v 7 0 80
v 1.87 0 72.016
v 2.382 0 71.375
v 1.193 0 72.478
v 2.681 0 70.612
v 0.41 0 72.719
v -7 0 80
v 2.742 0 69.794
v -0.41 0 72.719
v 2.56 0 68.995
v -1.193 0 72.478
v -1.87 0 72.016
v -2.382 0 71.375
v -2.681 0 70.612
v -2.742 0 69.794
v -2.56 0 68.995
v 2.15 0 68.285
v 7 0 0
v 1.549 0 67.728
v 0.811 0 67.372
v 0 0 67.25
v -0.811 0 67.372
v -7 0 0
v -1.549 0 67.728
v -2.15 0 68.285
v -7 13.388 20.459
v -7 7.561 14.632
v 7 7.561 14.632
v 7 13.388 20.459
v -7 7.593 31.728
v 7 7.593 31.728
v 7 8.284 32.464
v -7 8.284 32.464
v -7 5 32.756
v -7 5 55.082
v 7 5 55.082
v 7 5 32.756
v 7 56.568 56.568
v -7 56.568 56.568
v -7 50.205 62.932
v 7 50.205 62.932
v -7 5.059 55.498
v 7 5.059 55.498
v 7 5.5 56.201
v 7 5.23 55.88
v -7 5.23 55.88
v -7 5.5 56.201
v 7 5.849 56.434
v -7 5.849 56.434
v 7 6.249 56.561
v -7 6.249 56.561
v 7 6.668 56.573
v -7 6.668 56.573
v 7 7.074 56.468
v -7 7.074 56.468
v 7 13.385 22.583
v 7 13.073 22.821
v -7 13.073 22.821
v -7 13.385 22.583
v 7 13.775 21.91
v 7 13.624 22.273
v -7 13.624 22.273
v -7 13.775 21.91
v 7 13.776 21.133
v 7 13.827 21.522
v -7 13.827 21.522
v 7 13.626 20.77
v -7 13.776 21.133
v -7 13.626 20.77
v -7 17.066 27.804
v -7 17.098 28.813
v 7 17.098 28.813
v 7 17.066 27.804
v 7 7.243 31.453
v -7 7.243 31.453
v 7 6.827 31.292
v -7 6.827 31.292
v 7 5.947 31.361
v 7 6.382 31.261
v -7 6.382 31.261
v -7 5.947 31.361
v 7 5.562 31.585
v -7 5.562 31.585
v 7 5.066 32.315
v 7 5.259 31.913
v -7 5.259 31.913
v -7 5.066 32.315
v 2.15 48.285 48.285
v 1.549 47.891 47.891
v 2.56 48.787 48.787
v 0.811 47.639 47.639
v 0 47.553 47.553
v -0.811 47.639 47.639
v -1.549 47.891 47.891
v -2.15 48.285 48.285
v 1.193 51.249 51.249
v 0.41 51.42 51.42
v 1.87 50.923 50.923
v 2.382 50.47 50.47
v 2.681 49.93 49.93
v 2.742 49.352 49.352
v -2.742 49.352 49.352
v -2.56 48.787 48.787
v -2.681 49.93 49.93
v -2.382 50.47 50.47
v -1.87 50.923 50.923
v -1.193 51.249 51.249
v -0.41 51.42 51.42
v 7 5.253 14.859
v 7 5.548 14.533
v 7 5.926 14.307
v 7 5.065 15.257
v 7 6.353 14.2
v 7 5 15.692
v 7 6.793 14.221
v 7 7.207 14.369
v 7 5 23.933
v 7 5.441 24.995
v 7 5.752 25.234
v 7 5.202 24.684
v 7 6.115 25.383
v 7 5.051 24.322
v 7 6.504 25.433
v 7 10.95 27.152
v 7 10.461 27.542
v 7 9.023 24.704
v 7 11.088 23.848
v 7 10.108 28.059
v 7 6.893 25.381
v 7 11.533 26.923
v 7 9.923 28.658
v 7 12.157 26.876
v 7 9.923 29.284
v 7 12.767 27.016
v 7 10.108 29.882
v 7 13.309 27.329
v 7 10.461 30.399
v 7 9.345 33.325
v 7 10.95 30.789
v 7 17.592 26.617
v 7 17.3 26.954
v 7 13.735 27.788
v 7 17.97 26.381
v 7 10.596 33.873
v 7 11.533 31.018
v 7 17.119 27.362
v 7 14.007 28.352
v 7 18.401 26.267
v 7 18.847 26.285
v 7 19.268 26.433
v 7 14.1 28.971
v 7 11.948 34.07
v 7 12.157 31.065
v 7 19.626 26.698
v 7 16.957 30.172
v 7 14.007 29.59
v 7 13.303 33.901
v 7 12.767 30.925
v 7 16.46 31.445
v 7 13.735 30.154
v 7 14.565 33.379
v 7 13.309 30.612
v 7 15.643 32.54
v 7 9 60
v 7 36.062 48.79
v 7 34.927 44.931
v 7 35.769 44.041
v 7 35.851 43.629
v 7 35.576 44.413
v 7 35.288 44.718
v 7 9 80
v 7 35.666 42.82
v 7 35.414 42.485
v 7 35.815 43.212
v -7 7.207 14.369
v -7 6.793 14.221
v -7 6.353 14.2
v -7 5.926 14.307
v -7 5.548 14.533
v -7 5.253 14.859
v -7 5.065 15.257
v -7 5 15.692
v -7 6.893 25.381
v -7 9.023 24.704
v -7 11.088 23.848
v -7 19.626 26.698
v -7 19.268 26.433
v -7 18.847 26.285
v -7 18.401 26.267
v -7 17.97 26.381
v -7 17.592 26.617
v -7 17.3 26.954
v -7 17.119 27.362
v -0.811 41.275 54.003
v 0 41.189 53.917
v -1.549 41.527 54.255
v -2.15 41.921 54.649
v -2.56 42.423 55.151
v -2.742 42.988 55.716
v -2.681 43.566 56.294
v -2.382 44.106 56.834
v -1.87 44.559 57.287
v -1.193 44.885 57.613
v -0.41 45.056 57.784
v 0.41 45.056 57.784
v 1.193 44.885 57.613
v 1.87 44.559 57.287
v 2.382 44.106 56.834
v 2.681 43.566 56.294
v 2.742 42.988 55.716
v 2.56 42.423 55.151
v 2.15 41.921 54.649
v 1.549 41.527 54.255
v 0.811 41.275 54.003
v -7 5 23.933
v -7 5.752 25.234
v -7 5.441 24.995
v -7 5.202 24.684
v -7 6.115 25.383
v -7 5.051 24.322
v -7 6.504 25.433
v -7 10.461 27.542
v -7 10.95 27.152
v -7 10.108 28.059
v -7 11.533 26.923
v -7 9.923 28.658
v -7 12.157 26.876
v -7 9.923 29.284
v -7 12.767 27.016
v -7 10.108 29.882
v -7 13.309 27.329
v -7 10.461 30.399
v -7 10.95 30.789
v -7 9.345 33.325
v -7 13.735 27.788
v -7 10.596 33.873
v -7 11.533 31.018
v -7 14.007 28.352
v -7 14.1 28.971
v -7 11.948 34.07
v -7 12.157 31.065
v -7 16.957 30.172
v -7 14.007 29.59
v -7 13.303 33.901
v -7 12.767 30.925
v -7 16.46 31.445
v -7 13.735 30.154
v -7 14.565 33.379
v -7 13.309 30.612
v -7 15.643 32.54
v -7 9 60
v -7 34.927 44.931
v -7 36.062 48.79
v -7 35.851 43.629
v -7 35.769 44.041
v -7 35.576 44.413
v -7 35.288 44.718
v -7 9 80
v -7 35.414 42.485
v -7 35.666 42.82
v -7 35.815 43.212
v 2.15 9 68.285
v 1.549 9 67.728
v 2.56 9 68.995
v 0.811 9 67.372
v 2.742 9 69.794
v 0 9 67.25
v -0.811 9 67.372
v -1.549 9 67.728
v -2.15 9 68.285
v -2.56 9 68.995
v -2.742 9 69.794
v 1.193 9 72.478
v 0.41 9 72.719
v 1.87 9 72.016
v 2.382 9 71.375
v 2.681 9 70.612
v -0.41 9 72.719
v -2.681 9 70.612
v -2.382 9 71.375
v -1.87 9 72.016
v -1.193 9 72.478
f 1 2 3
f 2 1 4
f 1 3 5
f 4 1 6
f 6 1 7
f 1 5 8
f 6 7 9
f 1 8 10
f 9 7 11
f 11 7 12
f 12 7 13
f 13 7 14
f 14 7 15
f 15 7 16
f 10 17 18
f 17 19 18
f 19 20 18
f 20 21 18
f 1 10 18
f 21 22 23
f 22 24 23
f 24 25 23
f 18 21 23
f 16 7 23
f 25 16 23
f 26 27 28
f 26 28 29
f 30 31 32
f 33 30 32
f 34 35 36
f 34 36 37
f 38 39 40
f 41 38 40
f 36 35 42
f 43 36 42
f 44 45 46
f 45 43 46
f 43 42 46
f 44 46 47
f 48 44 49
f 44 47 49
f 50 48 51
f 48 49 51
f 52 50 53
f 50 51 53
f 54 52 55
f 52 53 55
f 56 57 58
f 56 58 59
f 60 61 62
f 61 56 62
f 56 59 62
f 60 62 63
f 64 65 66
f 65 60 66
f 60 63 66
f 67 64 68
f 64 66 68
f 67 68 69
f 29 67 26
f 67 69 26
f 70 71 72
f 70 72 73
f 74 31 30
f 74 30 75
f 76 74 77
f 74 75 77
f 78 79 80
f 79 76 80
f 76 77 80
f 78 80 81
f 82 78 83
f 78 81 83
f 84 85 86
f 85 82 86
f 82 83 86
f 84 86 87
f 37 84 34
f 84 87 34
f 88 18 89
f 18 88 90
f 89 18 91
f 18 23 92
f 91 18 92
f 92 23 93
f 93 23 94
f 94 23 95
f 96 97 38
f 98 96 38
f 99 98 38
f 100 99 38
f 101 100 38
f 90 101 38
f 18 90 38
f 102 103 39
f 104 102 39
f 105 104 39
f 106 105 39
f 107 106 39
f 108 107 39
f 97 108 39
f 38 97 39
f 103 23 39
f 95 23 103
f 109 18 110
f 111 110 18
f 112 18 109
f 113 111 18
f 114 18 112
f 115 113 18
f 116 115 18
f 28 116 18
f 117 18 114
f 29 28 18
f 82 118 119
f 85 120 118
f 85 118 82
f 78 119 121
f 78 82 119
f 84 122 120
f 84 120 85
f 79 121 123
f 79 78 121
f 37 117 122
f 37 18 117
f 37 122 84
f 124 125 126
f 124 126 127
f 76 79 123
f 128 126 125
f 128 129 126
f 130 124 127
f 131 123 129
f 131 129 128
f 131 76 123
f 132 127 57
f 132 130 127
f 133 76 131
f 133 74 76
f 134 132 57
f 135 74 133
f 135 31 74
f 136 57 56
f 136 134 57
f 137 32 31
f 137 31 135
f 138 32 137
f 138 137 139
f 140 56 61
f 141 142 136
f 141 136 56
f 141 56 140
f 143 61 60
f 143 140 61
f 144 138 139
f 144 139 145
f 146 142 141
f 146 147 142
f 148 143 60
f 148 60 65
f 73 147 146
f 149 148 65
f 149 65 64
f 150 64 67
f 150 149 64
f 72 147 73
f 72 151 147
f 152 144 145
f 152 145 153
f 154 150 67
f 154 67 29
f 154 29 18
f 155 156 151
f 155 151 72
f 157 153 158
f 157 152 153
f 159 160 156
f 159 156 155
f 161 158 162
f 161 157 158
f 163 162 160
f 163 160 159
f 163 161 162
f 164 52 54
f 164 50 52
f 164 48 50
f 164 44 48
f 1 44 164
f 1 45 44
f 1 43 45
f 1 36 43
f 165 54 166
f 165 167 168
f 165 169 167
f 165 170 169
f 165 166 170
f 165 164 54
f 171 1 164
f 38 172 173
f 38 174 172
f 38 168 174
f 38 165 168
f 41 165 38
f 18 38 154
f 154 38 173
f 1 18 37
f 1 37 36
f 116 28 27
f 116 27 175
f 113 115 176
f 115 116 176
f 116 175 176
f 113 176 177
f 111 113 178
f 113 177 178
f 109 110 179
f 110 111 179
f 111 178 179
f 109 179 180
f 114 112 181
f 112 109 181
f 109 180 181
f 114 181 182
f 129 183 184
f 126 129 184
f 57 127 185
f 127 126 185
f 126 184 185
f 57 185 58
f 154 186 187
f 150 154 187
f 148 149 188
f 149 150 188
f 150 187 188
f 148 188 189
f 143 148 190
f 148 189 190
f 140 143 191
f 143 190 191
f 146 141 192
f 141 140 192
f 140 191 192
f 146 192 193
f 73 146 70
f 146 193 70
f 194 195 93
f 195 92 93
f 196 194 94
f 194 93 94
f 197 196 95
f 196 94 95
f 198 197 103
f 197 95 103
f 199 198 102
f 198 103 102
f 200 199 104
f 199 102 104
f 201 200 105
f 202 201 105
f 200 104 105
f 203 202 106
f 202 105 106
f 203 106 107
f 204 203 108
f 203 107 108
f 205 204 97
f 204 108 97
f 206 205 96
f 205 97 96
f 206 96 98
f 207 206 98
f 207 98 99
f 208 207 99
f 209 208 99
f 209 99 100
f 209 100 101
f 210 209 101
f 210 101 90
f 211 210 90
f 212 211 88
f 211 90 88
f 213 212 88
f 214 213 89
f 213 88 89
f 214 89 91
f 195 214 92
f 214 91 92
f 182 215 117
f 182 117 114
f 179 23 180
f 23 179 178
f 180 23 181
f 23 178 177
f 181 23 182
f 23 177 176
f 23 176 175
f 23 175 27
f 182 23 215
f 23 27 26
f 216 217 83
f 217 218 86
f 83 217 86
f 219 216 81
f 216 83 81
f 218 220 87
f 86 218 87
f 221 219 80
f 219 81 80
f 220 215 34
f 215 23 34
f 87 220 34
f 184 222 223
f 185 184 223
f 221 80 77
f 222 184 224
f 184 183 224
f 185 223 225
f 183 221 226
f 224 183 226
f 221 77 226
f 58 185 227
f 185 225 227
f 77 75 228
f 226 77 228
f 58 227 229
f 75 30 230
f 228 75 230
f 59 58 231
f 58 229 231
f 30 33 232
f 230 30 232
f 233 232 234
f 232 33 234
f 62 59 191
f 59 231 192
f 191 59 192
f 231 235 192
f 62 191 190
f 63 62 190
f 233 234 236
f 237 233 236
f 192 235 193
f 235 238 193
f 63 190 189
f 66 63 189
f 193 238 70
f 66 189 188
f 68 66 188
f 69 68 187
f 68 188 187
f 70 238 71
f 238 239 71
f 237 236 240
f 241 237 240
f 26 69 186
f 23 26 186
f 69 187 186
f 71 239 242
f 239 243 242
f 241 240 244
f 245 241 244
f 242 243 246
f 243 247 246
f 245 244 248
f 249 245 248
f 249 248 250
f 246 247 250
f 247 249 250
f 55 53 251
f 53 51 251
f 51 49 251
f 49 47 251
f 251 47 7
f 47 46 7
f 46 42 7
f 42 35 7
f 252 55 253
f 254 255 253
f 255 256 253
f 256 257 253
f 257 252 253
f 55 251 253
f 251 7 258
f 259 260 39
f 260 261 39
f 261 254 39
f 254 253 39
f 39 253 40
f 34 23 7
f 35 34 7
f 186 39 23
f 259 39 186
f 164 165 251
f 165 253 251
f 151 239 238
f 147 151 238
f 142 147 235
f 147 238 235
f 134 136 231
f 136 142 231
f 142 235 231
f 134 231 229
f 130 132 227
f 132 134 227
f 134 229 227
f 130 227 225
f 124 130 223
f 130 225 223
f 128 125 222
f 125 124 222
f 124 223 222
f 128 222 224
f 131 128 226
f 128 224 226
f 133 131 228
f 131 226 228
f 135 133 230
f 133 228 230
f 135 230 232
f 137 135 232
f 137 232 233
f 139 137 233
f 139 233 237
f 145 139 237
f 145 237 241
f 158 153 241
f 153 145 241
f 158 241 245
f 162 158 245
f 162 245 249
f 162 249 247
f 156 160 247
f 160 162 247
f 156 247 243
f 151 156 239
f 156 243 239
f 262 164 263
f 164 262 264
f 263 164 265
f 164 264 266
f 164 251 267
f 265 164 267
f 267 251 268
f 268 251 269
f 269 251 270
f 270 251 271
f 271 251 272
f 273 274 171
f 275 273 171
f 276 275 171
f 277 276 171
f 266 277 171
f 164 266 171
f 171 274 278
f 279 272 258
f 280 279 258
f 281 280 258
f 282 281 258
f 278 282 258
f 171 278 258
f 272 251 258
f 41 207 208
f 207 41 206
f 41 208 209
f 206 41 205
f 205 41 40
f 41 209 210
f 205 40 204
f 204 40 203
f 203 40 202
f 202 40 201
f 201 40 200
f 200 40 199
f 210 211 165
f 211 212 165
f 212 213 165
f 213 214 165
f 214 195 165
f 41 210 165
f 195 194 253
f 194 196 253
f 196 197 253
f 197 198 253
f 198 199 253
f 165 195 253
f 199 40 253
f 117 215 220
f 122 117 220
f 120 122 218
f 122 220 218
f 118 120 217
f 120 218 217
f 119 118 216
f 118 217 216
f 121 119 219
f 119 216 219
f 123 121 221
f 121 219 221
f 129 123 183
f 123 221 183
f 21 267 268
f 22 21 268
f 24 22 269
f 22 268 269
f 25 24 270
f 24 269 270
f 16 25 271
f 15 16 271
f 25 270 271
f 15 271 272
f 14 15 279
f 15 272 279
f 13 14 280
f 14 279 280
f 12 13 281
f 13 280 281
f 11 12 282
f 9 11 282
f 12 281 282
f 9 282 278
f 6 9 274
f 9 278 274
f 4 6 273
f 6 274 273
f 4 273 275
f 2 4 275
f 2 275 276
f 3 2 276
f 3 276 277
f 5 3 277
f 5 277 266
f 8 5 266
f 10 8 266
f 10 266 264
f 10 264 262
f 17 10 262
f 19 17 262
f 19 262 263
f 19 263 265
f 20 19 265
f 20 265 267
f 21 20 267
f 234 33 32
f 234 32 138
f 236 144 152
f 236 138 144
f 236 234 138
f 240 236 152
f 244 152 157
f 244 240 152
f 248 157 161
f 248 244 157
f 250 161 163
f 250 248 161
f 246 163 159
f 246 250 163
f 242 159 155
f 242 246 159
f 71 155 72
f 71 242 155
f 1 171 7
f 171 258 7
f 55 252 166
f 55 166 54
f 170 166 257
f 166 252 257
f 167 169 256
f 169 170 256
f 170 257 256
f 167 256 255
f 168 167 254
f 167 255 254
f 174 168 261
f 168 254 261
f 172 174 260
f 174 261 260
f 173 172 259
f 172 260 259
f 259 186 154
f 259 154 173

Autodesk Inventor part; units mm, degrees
sketch "Sketch_1" plane through (0, 0, 0) normal (1, 0, 0) x (0, 1, 0)
  line L0 (0, 80) -> (0, 0)
  line L1 (0, 0) -> (56.5685, 56.5685)
  line L2 (56.5685, 56.5685) -> (50.2046, 62.9325)
  line L3 (50.2046, 62.9325) -> (36.0624, 48.7904)
  line L4 (36.0624, 48.7904) -> (9, 60)
  line L5 (9, 60) -> (9, 80)
  line L6 (9, 80) -> (0, 80)
  arc A0 (6.8931, 25.3806) -> (5, 23.933) centre (6.5, 23.933) ccw
  line L7 (5, 23.933) -> (5, 15.6924)
  arc A1 (5, 15.6924) -> (7.5607, 14.6317) centre (6.5, 15.6924) ccw
  line L8 (7.5607, 14.6317) -> (13.3877, 20.4587)
  arc A2 (13.3877, 20.4587) -> (13.0726, 22.821) centre (12.327, 21.5194) ccw
  arc A3 (13.0726, 22.821) -> (6.8931, 25.3806) centre (0, 0) ccw
  circle A4 centre (12, 28.9706) radius 2.1
  arc A5 (7.074, 56.4682) -> (5, 55.0824) centre (6.5, 55.0824) ccw
  line L9 (5, 55.0824) -> (5, 32.7559)
  arc A6 (5, 32.7559) -> (7.5929, 31.7285) centre (6.5, 32.7559) ccw
  line L10 (7.5929, 31.7285) -> (8.2843, 32.4639)
  arc A7 (17.0976, 28.8133) -> (8.2843, 32.4639) centre (12, 28.9706) ccw
  line L11 (17.0976, 28.8133) -> (17.0665, 27.8044)
  arc A8 (17.0665, 27.8044) -> (19.6264, 26.6975) centre (18.5657, 27.7581) ccw
  line L12 (19.6264, 26.6975) -> (35.4136, 42.4847)
  arc A9 (35.4136, 42.4847) -> (34.927, 44.9311) centre (34.3529, 43.5453) ccw
  line L13 (34.927, 44.9311) -> (7.074, 56.4682)
extrude "Extrusion1" add sketch "Sketch_1" along normal mid plane 14
sketch "Sketch2" plane through (-7, 50.2046, 62.9325) normal (0, -0.7071068, 0.7071068) x (1, 0, 0)
  point P0 (7, -10)
hole "Hole1" at (0, 43.1335, 55.8614) direction (0, 0.7071068, -0.7071068) diameter 5.5 depth 9
sketch "Sketch3" plane through (-7, 0, 80) normal (0, -1, 0) x (1, 0, 0)
  point P0 (7, -10)
hole "Hole2" at (0, 0, 70) direction (0, 1, 0) diameter 5.5 depth 9
ref_plane "bracket_to_dummy_XY" through (0, 0, 0) normal (0, 1, 0) x (1, 0, 0)
ref_plane "bracket_to_dummy_YZ" through (0, 0, 0) normal (1, 0, 0) x (0, 0, -1)
ref_plane "bracket_to_dummy_ZX" through (0, 0, 0) normal (0, 0, -1) x (0, 1, 0)
ref_plane "to_bolts_b_1_XY" through (0, 43.1335, 55.8614) normal (0, -0.7071068, 0.7071068) x (1, 0, 0)
ref_plane "to_bolts_b_1_YZ" through (0, 43.1335, 55.8614) normal (1, 0, 0) x (0, 0.7071068, 0.7071068)
ref_plane "to_bolts_b_1_ZX" through (0, 43.1335, 55.8614) normal (0, 0.7071068, 0.7071068) x (0, -0.7071068, 0.7071068)
ref_plane "to_bolts_base_b_1_XY" through (0, 9, 70) normal (0, 1, 0) x (1, 0, 0)
ref_plane "to_bolts_base_b_1_YZ" through (0, 9, 70) normal (1, 0, 0) x (0, 0, -1)
ref_plane "to_bolts_base_b_1_ZX" through (0, 9, 70) normal (0, 0, -1) x (0, 1, 0)
ref_plane "to_nuts_b_1_XY" through (0, 50.9117, 48.0833) normal (0, -0.7071068, 0.7071068) x (1, 0, 0)
ref_plane "to_nuts_b_1_YZ" through (0, 50.9117, 48.0833) normal (1, 0, 0) x (0, 0.7071068, 0.7071068)
ref_plane "to_nuts_b_1_ZX" through (0, 50.9117, 48.0833) normal (0, 0.7071068, 0.7071068) x (0, -0.7071068, 0.7071068)
ref_plane "to_nuts_base_b_1_XY" through (0, -2, 70) normal (0, 1, 0) x (1, 0, 0)
ref_plane "to_nuts_base_b_1_YZ" through (0, -2, 70) normal (1, 0, 0) x (0, 0, -1)
ref_plane "to_nuts_base_b_1_ZX" through (0, -2, 70) normal (0, 0, -1) x (0, 1, 0)
properties part number "HBL45TS5hbl45ts5" material "Stainless Steel"
